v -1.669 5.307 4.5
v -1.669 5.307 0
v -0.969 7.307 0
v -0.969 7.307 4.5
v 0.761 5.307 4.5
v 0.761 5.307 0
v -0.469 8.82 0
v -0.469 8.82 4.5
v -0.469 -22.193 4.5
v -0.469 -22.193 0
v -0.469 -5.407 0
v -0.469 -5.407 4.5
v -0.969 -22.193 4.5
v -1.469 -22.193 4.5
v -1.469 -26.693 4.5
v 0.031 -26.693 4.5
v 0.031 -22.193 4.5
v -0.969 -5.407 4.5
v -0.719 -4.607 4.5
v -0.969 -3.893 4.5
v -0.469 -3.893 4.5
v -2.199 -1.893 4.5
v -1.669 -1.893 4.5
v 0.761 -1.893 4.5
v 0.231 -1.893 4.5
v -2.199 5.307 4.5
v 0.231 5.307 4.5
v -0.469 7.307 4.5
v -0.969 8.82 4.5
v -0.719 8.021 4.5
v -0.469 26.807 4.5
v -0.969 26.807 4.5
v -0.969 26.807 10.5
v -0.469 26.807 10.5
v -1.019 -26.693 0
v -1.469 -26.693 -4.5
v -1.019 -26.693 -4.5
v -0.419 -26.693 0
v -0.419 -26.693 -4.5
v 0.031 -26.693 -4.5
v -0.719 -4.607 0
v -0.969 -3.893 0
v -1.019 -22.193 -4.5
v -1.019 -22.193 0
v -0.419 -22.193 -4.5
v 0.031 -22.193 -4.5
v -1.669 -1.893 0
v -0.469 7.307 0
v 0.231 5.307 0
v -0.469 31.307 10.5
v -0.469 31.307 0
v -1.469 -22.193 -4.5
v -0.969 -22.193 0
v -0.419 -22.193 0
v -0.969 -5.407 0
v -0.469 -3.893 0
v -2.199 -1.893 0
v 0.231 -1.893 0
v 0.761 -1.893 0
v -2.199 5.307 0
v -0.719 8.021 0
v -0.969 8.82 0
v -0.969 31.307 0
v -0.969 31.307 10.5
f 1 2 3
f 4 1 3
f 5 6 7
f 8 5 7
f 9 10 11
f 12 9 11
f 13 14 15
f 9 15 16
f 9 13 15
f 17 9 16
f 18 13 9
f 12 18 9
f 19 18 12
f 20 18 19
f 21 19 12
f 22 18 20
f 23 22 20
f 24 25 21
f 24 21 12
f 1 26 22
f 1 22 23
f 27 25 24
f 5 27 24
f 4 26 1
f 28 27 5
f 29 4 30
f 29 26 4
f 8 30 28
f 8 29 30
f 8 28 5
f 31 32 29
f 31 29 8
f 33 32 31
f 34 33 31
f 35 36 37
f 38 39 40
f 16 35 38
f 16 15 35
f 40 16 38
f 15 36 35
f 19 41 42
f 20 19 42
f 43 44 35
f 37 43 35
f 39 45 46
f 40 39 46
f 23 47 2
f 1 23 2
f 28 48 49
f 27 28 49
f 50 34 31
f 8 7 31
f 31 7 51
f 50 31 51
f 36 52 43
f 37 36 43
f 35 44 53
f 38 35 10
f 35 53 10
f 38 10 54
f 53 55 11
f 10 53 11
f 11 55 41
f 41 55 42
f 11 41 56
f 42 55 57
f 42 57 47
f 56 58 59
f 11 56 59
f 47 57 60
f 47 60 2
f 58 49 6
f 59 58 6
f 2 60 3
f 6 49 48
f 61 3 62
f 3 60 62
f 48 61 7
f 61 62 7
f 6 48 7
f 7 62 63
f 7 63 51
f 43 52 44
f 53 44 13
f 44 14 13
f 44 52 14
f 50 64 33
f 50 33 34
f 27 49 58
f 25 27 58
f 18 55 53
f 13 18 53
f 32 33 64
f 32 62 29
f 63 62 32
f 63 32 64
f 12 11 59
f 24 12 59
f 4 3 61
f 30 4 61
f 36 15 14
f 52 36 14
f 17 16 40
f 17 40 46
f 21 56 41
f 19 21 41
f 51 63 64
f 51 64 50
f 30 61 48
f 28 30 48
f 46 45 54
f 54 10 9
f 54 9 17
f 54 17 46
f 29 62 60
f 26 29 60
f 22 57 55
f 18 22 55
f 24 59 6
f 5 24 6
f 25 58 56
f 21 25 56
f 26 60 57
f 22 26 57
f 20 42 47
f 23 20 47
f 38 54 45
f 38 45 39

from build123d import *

# Parameters (mm, degrees)
F1_DEPTH = 4.5
F2_W     = 0.5
F2_H     = 4.5
F3_DEPTH = 6
F4_W     = 0.5
F4_H     = 4.5
F5_DEPTH = 9
F6_W     = 0.6
F6_H     = 4.5
F7_DEPTH = 25


with BuildPart() as f1:
    # F0 (on Top) → F1 (new body)
    with BuildSketch(Plane.XY):
        Polygon((-0.469149, 31.306926), (-0.969149, 31.306926), (-0.969149, 8.820471), (-2.198889, 5.306926), (-2.198889, -1.893074), (-0.969149, -5.406618), (-0.969149, -26.693074), (-0.469149, -26.693074), (-0.469149, -5.406618), (0.760592, -1.893074), (0.760592, 5.306926), (-0.469149, 8.820471), align=None)
        Polygon((-1.669149, -1.893074), (-1.669149, 5.306926), (-0.969149, 7.306926), (-0.719149, 8.021212), (-0.469149, 7.306926), (0.230851, 5.306926), (0.230851, -1.893074), (-0.469149, -3.893074), (-0.719149, -4.607359), (-0.969149, -3.893074), align=None, mode=Mode.SUBTRACT)
    extrude(amount=F1_DEPTH)

    # F2 (on face) → F3 (join)
    with BuildSketch(Plane.XY.offset(4.5)):
        with Locations((-0.719149, 29.056926)):
            Rectangle(F2_W, F2_H)
    extrude(amount=F3_DEPTH)

    # F4 (on face) → F5 (join)
    with BuildSketch(Plane.XY.offset(4.5)):
        with Locations((-0.219149, -24.443074)):
            Rectangle(F4_W, F4_H)
        with Locations((-1.219149, -24.443074)):
            Rectangle(F4_W, F4_H)
    extrude(amount=-F5_DEPTH)

    # F6 (on face) → F7 (cut)
    with BuildSketch(Plane(origin=(0, 0, 0), x_dir=(1, 0, 0), z_dir=(0, 0, -1))):
        with Locations((-0.719149, 24.443074)):
            Rectangle(F6_W, F6_H)
    extrude(amount=F7_DEPTH, mode=Mode.SUBTRACT)


solid = f1.part
